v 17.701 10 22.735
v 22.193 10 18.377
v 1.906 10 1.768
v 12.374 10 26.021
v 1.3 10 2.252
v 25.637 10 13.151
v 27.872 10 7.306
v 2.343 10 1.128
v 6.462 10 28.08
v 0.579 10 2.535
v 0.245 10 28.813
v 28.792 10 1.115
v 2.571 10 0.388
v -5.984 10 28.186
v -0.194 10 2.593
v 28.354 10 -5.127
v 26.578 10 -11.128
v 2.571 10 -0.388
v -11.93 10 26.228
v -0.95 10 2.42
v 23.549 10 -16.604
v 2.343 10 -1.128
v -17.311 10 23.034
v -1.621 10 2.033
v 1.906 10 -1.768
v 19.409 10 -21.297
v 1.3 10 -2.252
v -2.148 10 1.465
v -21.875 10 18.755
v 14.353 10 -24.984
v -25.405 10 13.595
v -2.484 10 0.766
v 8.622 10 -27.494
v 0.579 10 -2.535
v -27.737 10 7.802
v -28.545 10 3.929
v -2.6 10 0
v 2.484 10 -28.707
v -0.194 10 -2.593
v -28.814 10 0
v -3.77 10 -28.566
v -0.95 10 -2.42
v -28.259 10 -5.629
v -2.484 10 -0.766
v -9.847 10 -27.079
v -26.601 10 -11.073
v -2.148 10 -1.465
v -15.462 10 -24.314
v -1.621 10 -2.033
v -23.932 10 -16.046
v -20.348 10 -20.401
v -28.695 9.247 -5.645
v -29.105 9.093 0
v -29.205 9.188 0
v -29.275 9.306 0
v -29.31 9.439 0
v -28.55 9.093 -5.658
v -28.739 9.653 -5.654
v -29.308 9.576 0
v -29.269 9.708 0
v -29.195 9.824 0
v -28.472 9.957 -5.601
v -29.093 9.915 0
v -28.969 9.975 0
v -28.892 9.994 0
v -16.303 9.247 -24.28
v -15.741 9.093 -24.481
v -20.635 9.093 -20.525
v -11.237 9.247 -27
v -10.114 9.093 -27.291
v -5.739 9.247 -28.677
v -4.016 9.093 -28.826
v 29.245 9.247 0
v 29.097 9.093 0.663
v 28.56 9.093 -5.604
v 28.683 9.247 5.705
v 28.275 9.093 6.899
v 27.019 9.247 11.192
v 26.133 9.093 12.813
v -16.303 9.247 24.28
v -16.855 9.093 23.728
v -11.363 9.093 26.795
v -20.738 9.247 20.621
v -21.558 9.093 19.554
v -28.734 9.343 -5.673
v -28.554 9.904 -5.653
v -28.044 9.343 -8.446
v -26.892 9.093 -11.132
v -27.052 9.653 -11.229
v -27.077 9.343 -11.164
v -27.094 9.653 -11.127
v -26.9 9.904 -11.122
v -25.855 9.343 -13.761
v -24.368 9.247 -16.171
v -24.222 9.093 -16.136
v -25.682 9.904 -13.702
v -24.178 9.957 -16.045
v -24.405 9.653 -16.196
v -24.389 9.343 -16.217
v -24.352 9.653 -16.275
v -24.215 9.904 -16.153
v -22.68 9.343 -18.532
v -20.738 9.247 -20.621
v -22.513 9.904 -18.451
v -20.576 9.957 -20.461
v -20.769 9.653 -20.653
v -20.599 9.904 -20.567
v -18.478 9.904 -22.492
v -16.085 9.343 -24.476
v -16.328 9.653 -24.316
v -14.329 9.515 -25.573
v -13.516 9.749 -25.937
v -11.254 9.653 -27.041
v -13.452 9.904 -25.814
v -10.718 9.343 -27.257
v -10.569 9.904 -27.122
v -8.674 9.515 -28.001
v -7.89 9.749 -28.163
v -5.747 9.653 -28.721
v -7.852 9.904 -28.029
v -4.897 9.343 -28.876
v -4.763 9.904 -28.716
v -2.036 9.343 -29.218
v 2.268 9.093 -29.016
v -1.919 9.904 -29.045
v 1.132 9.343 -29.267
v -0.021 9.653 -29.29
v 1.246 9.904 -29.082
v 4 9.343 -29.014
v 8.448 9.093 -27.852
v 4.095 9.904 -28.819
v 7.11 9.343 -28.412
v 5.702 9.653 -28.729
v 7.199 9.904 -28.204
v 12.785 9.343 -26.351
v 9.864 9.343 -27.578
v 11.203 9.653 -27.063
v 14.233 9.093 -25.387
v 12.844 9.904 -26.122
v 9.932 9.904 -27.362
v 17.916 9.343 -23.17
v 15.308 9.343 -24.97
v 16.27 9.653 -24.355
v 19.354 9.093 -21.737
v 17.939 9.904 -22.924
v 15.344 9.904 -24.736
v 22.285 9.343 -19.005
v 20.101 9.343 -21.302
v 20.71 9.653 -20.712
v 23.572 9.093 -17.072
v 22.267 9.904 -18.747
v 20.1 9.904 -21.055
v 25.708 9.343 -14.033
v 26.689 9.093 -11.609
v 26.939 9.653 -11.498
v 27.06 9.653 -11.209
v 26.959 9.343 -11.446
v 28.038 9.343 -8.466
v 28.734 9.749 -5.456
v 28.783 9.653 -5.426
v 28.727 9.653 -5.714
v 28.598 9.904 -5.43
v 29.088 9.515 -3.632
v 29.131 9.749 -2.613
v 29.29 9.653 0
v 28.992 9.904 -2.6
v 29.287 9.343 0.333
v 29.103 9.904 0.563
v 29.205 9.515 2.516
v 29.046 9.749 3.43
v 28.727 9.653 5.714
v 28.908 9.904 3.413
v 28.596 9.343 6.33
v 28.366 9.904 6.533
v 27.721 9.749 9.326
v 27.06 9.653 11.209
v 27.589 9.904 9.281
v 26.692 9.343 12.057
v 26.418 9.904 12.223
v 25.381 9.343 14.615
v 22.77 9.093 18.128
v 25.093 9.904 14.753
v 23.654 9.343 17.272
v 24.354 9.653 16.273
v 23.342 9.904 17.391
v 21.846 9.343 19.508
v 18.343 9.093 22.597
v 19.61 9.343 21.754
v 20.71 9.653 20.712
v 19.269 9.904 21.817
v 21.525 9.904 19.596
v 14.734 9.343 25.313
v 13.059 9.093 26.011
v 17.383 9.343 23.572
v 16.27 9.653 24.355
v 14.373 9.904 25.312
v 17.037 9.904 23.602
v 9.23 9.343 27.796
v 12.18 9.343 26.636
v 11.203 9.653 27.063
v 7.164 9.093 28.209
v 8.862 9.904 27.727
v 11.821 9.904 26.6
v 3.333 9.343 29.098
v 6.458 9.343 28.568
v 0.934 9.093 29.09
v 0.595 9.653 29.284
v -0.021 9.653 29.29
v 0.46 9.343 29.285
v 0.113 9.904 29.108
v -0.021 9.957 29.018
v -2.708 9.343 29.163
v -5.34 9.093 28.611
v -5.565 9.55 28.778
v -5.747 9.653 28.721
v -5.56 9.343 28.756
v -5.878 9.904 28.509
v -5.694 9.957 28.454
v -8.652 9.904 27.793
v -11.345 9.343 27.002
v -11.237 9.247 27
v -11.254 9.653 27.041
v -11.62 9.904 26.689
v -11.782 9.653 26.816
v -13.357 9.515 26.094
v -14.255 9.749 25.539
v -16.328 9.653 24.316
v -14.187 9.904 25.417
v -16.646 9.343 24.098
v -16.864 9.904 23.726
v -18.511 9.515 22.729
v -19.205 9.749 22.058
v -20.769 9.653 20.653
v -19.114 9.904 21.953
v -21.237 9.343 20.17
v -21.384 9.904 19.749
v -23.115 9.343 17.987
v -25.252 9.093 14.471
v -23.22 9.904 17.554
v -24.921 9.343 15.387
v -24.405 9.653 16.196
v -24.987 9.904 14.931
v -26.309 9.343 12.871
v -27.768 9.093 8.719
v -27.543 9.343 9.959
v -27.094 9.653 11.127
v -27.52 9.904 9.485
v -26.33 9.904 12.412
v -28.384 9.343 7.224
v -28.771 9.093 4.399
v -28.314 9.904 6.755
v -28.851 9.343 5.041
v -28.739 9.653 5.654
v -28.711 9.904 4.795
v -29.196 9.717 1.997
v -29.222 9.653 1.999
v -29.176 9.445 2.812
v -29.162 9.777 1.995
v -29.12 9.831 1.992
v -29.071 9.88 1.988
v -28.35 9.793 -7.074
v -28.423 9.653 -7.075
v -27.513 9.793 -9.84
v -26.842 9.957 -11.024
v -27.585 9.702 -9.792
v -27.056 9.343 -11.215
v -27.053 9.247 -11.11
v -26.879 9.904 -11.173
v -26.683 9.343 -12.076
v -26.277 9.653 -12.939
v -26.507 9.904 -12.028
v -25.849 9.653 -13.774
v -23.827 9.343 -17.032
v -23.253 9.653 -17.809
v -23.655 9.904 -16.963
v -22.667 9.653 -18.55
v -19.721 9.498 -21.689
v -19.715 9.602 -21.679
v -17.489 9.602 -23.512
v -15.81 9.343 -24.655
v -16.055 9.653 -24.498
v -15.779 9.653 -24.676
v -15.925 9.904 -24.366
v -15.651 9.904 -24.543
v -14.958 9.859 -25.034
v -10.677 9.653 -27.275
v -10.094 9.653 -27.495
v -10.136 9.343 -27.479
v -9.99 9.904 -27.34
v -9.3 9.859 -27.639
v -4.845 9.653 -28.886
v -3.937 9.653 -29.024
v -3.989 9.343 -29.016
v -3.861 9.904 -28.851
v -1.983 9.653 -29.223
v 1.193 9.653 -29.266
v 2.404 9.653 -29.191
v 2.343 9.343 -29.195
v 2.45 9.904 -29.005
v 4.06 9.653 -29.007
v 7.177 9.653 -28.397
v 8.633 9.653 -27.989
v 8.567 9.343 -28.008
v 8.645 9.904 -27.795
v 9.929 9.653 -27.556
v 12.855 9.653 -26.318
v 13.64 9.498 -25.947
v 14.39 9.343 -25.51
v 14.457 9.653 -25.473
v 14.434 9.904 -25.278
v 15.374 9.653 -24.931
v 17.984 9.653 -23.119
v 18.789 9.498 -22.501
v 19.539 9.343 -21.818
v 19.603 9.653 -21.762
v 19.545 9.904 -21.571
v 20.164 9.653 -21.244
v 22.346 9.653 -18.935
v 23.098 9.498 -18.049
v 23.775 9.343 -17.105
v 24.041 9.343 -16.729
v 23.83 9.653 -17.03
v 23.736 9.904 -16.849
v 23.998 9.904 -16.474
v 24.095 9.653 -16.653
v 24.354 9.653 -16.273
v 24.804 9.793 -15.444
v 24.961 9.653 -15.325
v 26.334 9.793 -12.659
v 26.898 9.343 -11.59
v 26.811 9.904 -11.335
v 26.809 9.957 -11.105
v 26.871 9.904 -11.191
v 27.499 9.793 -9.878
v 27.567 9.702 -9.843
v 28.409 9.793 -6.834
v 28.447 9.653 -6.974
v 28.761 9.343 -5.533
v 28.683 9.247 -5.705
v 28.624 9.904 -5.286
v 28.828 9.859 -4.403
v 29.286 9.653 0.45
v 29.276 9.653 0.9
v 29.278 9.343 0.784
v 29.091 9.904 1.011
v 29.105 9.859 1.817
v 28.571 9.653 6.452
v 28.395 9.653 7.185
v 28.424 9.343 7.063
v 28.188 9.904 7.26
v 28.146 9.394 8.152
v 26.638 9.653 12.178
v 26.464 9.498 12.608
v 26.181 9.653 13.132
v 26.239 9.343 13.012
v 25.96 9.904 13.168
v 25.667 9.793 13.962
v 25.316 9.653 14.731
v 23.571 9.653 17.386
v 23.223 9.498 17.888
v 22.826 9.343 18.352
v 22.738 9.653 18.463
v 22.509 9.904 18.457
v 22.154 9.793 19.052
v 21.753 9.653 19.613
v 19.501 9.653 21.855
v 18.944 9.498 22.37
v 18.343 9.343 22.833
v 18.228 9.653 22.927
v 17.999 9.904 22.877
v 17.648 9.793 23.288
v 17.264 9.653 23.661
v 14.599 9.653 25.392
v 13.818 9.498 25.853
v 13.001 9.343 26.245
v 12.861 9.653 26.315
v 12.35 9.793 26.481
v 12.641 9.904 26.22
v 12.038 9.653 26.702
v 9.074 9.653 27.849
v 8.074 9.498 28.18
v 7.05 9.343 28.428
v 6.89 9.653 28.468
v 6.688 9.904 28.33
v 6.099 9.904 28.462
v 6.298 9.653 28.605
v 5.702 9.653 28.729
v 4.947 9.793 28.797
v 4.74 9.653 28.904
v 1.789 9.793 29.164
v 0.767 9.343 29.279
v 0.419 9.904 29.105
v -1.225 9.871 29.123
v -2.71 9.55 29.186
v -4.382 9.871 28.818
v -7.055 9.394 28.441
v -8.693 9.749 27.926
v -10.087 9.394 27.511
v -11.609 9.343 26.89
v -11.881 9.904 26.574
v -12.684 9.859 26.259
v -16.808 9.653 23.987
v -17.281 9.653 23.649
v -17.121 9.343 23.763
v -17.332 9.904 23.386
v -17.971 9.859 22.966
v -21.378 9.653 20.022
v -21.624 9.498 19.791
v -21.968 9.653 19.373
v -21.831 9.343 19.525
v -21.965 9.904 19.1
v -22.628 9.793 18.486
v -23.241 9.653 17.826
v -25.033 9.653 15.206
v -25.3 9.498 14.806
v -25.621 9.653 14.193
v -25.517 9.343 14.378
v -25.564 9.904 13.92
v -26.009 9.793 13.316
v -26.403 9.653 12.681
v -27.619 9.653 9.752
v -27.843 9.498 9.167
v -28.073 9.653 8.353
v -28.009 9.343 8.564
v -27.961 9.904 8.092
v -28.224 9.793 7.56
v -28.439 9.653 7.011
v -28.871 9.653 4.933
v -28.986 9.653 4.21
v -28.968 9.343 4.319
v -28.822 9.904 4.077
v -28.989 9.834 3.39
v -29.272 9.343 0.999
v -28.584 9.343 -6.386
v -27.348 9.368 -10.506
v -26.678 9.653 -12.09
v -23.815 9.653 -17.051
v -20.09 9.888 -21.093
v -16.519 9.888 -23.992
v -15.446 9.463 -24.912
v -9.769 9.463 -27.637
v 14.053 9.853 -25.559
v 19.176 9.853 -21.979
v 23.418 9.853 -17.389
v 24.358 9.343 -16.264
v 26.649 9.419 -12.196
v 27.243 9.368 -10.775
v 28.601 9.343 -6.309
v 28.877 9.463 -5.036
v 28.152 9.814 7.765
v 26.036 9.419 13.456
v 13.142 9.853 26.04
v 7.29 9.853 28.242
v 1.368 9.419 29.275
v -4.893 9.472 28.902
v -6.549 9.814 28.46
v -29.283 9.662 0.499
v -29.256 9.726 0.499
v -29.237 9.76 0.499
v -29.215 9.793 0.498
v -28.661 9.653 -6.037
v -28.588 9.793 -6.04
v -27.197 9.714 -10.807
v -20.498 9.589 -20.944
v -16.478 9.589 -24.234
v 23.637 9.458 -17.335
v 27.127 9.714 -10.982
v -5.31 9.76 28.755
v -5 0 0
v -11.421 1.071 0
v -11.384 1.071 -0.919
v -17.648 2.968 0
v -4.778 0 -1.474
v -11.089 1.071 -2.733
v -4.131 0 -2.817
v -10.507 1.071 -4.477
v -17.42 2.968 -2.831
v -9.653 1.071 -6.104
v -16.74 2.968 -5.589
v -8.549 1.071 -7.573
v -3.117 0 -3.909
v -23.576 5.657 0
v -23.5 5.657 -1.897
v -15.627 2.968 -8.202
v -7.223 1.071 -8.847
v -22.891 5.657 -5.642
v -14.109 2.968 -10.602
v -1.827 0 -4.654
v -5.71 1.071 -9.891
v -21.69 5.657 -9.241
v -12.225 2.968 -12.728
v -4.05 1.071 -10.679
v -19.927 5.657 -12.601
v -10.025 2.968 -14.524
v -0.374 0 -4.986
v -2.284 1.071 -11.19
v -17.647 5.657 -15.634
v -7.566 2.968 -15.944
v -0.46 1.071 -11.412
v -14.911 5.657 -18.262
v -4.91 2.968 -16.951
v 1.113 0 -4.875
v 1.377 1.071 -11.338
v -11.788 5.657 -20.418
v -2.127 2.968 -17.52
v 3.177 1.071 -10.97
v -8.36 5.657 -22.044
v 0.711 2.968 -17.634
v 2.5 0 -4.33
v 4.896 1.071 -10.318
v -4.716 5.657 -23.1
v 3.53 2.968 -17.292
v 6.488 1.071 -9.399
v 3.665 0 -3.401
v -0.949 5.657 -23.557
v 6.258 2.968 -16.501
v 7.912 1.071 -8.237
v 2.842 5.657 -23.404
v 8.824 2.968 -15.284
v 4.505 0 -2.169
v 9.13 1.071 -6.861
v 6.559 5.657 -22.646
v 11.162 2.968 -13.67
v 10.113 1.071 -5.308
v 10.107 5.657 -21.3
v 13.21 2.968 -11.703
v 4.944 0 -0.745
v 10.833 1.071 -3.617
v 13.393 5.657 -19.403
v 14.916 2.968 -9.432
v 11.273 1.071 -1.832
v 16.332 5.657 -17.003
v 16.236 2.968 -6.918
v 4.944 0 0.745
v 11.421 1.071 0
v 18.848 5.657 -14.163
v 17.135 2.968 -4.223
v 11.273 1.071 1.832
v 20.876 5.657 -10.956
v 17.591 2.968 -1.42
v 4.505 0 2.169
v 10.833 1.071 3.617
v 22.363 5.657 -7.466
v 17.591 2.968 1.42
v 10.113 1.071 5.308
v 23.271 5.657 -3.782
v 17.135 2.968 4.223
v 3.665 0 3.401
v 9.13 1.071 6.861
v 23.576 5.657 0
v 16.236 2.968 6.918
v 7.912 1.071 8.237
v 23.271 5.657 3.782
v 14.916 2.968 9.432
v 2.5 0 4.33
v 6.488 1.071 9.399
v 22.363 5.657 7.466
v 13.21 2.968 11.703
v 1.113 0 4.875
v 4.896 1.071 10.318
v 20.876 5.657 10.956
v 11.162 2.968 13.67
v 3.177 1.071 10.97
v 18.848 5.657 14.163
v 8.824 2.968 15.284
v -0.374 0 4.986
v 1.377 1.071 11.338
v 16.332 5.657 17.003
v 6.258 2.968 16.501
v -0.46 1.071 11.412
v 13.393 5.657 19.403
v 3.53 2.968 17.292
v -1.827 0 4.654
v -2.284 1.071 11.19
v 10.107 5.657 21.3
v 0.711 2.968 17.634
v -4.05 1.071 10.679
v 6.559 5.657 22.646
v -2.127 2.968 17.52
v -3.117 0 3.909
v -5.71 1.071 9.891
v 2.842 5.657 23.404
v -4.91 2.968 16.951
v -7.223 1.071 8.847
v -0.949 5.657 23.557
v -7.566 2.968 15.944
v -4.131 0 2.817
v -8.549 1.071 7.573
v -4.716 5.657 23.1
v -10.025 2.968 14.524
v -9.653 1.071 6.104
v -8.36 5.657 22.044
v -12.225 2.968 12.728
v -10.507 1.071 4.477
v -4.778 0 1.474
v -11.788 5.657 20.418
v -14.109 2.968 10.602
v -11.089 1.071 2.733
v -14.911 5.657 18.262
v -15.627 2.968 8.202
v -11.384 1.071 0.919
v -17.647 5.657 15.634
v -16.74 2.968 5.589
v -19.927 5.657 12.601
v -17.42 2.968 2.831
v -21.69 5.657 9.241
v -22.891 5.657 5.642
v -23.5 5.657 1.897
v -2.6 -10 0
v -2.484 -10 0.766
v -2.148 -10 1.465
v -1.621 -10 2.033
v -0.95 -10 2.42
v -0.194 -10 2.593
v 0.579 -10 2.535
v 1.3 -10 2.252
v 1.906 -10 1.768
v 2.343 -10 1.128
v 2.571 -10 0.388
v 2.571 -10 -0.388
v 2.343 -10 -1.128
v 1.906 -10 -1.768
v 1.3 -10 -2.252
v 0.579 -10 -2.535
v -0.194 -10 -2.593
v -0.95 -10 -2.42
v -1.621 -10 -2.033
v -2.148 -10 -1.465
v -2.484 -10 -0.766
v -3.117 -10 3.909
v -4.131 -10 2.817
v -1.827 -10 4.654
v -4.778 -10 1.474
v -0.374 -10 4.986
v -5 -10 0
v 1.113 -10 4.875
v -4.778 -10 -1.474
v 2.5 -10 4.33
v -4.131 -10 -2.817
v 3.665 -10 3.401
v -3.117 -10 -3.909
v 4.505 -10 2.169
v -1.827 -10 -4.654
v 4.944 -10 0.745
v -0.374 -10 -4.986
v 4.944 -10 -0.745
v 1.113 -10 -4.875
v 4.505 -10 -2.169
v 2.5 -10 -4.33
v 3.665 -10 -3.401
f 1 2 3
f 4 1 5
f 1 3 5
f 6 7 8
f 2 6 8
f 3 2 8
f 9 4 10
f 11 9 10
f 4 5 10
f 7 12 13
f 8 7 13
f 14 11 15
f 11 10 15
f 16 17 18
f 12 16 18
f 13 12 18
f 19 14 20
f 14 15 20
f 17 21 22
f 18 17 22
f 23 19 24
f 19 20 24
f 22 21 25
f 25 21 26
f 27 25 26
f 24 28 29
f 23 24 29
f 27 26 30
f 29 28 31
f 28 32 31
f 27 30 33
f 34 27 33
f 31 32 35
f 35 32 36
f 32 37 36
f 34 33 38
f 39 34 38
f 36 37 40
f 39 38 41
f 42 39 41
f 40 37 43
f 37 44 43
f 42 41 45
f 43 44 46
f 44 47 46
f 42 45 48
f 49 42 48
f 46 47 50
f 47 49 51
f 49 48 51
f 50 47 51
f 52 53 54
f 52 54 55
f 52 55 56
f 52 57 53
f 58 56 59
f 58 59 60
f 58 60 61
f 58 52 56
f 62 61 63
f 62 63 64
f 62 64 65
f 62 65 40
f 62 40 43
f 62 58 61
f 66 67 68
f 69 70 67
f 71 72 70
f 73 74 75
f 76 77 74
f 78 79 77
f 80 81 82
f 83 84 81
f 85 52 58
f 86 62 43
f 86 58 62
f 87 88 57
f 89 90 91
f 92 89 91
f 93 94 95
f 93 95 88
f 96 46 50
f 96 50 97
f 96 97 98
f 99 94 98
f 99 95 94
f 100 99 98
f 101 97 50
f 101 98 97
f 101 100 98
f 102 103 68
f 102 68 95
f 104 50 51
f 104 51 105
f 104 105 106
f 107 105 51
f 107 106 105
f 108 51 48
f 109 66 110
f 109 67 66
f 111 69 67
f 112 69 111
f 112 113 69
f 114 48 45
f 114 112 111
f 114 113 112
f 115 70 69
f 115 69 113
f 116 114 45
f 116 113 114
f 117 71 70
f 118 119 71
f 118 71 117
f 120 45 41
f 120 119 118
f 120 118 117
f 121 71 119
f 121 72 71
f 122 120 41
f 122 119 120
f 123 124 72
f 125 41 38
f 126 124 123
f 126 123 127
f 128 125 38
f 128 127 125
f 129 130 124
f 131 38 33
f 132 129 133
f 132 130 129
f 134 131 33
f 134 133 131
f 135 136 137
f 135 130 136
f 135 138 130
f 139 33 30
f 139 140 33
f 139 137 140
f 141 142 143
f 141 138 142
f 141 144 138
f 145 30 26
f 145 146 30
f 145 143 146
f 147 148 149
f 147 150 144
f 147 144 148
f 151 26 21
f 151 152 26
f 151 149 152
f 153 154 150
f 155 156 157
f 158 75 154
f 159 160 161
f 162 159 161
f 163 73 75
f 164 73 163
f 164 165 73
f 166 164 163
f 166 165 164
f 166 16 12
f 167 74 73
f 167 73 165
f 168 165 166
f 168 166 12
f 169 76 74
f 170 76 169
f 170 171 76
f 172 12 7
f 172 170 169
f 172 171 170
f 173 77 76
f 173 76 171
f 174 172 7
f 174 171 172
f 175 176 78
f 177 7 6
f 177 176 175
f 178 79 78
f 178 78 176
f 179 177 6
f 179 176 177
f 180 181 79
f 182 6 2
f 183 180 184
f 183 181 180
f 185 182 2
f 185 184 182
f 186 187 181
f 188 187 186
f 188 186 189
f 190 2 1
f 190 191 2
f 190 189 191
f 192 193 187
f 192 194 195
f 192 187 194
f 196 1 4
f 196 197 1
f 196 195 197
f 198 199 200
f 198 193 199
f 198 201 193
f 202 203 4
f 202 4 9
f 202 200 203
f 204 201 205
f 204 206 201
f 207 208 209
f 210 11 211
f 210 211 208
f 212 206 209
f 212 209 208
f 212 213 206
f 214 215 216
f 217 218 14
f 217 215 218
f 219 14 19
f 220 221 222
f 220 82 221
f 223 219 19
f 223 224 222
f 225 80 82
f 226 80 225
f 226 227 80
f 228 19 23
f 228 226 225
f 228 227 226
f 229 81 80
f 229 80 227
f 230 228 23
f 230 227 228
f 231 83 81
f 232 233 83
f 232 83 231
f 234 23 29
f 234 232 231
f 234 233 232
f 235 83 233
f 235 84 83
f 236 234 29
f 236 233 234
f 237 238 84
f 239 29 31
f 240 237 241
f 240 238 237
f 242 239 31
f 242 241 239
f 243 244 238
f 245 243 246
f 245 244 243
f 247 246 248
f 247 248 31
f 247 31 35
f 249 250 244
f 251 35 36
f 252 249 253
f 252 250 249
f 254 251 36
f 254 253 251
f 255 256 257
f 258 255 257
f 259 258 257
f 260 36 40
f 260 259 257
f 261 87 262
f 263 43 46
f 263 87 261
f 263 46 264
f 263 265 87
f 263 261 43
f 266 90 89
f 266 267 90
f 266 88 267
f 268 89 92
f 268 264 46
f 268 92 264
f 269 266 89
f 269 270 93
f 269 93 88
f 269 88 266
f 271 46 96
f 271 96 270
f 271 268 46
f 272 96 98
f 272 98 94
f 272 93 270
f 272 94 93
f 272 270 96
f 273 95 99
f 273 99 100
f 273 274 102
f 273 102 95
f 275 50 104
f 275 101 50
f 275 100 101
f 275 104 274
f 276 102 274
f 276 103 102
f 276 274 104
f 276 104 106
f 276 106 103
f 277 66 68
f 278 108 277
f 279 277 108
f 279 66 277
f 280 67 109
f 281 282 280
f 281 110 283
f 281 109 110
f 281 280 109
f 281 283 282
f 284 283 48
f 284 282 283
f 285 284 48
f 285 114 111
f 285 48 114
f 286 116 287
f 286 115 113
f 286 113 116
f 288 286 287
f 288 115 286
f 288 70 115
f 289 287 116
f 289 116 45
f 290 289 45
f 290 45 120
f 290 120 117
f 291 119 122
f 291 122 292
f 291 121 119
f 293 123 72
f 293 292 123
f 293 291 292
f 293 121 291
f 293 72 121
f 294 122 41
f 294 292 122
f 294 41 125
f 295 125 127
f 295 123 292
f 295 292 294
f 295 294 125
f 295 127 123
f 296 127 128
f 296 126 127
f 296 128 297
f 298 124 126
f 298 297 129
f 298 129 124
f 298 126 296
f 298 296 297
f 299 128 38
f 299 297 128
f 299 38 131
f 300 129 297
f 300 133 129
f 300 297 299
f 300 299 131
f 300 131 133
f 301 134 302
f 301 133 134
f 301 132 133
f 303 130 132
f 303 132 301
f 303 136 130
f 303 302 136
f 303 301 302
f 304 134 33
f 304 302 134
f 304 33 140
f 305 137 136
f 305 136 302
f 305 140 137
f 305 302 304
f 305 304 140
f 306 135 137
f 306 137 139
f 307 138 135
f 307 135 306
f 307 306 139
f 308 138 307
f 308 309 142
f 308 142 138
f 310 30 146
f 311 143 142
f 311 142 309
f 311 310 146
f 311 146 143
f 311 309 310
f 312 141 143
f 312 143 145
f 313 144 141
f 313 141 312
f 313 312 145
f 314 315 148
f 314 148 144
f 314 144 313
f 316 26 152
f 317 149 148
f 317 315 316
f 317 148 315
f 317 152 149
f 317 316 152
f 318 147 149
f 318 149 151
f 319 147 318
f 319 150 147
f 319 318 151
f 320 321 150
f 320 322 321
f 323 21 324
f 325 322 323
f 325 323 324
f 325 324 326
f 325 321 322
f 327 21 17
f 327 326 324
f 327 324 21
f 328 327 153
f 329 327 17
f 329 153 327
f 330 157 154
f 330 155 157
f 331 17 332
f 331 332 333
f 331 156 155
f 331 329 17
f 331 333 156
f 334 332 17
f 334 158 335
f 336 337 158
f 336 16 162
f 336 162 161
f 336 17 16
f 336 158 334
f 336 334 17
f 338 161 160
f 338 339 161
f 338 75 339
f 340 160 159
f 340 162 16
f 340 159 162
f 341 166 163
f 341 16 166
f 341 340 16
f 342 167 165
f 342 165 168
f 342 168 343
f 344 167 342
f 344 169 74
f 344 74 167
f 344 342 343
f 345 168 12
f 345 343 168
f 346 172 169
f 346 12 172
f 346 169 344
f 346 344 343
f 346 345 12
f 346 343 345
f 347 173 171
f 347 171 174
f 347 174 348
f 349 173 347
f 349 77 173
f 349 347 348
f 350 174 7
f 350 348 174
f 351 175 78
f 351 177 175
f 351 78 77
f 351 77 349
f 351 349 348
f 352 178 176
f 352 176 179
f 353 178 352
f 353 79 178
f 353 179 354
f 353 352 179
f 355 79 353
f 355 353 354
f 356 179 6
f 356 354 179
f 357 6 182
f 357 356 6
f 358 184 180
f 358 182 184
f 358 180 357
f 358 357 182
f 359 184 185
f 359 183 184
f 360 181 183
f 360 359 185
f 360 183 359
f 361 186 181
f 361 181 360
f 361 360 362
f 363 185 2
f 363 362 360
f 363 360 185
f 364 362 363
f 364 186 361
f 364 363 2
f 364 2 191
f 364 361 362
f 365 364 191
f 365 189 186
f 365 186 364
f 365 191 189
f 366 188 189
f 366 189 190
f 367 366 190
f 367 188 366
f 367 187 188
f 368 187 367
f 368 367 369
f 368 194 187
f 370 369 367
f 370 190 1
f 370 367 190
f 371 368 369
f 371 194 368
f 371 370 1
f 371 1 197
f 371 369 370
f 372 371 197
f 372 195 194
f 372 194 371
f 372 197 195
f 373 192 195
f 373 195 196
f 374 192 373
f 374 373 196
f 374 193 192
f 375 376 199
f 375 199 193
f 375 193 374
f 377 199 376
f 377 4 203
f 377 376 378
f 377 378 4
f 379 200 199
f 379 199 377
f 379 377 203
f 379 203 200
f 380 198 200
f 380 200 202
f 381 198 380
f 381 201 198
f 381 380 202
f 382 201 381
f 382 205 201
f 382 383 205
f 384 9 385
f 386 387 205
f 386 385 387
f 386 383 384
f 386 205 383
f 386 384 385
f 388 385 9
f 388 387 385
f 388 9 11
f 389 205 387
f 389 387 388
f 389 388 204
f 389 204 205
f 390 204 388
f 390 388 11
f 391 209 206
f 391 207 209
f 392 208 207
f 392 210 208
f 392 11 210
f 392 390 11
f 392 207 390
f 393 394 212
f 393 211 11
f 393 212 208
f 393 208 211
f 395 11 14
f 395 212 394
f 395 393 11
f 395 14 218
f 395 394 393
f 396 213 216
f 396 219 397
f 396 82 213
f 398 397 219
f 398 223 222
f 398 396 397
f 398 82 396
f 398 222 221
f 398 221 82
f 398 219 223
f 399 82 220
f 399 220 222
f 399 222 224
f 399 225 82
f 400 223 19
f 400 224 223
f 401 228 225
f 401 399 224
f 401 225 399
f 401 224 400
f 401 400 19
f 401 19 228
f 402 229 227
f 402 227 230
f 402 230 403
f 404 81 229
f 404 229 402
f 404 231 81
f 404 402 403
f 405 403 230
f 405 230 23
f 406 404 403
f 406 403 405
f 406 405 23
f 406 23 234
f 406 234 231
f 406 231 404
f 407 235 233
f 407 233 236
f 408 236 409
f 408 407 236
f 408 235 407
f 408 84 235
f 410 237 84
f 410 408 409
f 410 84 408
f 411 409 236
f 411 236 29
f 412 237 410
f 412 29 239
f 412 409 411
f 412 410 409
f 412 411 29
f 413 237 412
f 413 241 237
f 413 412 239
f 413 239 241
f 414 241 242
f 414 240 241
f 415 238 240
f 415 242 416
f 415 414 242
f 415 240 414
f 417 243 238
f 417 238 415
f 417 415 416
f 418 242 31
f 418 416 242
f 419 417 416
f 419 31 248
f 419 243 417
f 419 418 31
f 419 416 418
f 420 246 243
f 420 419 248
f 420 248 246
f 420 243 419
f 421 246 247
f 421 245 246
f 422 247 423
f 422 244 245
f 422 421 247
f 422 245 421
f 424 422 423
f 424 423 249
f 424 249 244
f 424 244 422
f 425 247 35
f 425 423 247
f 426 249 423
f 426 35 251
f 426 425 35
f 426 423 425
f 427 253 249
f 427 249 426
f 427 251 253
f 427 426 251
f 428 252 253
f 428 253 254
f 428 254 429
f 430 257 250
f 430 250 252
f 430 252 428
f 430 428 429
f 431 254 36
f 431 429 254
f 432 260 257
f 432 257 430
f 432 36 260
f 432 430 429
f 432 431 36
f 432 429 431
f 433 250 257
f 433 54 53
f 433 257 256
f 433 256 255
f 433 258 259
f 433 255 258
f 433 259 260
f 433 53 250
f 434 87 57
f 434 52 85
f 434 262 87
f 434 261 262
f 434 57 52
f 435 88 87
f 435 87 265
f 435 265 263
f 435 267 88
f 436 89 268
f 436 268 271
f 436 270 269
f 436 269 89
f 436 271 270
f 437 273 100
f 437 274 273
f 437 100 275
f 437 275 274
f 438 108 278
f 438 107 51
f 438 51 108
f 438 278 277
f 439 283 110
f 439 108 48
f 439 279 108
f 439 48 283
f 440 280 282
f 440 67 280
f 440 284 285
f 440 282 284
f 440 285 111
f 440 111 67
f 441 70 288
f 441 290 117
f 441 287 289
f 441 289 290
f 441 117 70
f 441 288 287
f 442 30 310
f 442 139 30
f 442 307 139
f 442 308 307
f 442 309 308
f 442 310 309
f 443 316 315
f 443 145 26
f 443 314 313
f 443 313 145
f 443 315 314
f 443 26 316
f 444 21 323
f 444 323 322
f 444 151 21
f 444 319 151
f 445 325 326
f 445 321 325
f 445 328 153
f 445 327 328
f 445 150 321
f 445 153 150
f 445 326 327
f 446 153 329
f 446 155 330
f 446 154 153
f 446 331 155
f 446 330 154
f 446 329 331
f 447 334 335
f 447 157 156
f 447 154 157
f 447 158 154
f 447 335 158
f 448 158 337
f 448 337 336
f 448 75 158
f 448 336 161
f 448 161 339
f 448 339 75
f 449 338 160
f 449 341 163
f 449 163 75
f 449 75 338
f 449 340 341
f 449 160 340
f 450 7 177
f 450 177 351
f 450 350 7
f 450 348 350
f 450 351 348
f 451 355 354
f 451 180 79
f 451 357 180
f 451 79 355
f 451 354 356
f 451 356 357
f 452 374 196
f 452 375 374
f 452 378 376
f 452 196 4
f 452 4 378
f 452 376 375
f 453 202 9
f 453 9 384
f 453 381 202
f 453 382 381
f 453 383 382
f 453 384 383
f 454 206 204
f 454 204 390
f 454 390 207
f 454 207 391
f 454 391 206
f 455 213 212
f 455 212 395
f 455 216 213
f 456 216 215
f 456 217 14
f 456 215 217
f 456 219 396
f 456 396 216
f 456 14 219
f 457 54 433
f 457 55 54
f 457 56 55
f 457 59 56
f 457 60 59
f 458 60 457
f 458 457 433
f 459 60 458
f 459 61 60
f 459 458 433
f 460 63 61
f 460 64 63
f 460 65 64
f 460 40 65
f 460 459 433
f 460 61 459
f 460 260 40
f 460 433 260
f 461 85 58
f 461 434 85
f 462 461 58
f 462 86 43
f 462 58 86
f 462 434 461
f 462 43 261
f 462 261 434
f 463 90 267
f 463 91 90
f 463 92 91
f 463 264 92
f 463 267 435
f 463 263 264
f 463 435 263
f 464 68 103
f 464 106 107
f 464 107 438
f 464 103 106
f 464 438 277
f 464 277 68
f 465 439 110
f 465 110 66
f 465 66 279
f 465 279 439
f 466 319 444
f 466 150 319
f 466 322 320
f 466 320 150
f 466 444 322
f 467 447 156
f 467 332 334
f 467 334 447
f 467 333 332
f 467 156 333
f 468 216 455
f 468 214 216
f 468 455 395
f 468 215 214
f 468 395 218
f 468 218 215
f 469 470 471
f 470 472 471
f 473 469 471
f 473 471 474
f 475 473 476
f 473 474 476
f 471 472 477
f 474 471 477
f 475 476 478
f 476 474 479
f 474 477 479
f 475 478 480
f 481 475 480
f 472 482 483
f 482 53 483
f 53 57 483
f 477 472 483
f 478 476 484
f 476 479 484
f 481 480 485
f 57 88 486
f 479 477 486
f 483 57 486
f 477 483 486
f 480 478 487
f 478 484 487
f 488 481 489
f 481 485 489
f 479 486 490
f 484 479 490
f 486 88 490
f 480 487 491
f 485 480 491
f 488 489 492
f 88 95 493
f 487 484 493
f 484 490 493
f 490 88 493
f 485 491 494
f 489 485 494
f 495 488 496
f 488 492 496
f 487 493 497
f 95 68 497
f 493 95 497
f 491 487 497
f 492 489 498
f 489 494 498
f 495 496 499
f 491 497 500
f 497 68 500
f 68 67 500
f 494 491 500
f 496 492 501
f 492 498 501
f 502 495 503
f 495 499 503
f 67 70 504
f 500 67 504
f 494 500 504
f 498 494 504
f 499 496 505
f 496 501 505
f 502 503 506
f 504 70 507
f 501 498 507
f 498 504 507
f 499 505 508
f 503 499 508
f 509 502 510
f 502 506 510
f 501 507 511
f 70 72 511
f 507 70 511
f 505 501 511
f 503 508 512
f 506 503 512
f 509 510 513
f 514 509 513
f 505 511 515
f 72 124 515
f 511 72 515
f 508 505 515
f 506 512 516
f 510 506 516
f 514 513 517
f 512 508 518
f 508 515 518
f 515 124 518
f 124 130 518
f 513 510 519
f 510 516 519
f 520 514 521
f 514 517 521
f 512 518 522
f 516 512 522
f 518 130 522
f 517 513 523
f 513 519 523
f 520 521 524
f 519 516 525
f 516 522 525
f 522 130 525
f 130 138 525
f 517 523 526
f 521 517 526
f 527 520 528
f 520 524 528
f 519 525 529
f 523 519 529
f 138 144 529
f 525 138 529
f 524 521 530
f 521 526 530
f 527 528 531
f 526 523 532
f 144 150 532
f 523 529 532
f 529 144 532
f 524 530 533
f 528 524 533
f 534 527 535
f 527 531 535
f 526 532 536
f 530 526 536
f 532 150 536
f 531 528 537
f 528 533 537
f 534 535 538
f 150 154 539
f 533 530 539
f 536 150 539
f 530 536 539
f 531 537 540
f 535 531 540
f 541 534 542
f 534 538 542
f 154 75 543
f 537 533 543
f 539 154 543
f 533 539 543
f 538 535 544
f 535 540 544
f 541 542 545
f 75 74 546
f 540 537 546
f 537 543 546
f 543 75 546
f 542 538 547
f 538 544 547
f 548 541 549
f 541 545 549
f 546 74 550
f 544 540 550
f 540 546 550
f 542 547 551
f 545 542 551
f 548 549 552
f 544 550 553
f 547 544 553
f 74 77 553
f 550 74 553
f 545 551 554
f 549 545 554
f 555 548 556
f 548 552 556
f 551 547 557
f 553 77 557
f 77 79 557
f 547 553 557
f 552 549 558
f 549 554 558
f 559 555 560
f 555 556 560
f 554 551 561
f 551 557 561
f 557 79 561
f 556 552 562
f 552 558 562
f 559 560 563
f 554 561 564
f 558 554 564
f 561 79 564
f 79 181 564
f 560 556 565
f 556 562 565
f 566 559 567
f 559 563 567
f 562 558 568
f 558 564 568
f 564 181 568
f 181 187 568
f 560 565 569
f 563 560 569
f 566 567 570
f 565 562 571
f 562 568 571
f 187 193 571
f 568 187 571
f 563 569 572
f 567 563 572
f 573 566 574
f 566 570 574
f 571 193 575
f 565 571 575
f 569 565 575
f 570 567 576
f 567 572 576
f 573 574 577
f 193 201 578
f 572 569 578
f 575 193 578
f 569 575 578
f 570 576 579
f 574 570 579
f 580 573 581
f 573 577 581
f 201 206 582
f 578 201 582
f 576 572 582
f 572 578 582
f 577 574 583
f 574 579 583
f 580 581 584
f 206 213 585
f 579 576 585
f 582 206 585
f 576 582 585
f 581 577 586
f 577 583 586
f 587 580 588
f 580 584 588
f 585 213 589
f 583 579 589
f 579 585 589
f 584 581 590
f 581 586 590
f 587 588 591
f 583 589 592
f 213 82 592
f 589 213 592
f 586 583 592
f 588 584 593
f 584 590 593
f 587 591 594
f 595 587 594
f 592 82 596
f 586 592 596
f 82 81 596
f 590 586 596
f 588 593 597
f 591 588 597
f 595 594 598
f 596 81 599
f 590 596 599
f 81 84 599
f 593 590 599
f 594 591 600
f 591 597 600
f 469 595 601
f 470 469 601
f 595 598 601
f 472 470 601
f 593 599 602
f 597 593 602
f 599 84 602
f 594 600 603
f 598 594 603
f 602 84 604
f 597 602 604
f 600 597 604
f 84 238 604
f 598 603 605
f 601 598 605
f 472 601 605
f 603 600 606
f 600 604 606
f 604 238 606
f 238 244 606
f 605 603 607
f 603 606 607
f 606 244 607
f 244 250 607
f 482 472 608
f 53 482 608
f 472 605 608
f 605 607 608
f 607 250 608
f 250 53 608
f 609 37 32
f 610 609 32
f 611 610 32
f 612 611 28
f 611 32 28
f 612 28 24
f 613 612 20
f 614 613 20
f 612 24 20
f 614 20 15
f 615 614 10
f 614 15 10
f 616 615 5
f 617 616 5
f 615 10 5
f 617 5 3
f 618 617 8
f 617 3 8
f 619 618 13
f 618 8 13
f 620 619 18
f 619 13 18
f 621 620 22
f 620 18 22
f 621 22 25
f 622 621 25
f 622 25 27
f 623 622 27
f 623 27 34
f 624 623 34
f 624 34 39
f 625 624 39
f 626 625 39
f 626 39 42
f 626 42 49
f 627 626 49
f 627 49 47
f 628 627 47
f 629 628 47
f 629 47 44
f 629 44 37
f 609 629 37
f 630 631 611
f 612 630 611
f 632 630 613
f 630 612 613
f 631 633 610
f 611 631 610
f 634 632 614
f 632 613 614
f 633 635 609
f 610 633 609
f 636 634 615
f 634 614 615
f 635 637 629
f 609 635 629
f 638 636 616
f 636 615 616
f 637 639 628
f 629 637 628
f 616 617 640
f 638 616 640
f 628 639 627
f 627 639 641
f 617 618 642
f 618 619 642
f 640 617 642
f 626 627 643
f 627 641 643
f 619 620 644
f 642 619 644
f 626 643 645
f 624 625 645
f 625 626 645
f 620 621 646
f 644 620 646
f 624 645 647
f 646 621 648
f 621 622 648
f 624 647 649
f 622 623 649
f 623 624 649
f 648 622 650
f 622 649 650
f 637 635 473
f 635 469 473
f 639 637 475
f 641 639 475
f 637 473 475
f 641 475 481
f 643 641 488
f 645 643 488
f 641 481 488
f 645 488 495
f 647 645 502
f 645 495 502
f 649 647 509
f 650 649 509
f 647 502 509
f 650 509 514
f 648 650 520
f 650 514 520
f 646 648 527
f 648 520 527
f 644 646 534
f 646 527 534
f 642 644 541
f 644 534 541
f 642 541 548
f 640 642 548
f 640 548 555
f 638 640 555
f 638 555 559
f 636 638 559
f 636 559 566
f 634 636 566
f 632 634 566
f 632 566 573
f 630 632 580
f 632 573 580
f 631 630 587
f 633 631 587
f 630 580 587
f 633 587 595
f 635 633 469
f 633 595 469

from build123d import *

# Parameters (mm, degrees)
SKETCH2_R          = 2.6
CUT_EXTRUDE1_DEPTH = 48.328372824
FILLET1_R          = 0.5


with BuildPart() as part:
    # Sketch1 → Revolve1 (revolve)
    with BuildSketch(Plane.XY, mode=Mode.PRIVATE) as revolve1_sk:
        with BuildLine():
            Line((0, 10), (0, 0))
            Line((0, 0), (0, -10))
            Line((0, -10), (5, -10))
            Line((5, -10), (5, 0))
            ThreePointArc((5, 0), (18.359605006, 3.242115389), (30.331294682, 10))
            Line((30.331294682, 10), (0, 10))
        make_face()
    revolve(revolve1_sk.sketch.rotate(Axis((0, 10, 0), (0, -1, 0)), 180), axis=Axis((0, 10, 0), (0, -1, 0)))

    # Sketch2 → Cut-Extrude1 (cut, through all)
    with BuildSketch(Plane(origin=(0, 10, 0), x_dir=(1, 0, 0), z_dir=(0, 1, 0))):
        with Locations(Location((0, 0, 0), (0, 0, 180))):
            Circle(SKETCH2_R)
    extrude(amount=-CUT_EXTRUDE1_DEPTH, mode=Mode.SUBTRACT)

    # Fillet1
    fillet1_edges = [part.edges().sort_by_distance(p)[0] for p in [
        (30.331294682, 10, 0),
    ]]
    fillet(fillet1_edges, radius=FILLET1_R)


solid = part.part
